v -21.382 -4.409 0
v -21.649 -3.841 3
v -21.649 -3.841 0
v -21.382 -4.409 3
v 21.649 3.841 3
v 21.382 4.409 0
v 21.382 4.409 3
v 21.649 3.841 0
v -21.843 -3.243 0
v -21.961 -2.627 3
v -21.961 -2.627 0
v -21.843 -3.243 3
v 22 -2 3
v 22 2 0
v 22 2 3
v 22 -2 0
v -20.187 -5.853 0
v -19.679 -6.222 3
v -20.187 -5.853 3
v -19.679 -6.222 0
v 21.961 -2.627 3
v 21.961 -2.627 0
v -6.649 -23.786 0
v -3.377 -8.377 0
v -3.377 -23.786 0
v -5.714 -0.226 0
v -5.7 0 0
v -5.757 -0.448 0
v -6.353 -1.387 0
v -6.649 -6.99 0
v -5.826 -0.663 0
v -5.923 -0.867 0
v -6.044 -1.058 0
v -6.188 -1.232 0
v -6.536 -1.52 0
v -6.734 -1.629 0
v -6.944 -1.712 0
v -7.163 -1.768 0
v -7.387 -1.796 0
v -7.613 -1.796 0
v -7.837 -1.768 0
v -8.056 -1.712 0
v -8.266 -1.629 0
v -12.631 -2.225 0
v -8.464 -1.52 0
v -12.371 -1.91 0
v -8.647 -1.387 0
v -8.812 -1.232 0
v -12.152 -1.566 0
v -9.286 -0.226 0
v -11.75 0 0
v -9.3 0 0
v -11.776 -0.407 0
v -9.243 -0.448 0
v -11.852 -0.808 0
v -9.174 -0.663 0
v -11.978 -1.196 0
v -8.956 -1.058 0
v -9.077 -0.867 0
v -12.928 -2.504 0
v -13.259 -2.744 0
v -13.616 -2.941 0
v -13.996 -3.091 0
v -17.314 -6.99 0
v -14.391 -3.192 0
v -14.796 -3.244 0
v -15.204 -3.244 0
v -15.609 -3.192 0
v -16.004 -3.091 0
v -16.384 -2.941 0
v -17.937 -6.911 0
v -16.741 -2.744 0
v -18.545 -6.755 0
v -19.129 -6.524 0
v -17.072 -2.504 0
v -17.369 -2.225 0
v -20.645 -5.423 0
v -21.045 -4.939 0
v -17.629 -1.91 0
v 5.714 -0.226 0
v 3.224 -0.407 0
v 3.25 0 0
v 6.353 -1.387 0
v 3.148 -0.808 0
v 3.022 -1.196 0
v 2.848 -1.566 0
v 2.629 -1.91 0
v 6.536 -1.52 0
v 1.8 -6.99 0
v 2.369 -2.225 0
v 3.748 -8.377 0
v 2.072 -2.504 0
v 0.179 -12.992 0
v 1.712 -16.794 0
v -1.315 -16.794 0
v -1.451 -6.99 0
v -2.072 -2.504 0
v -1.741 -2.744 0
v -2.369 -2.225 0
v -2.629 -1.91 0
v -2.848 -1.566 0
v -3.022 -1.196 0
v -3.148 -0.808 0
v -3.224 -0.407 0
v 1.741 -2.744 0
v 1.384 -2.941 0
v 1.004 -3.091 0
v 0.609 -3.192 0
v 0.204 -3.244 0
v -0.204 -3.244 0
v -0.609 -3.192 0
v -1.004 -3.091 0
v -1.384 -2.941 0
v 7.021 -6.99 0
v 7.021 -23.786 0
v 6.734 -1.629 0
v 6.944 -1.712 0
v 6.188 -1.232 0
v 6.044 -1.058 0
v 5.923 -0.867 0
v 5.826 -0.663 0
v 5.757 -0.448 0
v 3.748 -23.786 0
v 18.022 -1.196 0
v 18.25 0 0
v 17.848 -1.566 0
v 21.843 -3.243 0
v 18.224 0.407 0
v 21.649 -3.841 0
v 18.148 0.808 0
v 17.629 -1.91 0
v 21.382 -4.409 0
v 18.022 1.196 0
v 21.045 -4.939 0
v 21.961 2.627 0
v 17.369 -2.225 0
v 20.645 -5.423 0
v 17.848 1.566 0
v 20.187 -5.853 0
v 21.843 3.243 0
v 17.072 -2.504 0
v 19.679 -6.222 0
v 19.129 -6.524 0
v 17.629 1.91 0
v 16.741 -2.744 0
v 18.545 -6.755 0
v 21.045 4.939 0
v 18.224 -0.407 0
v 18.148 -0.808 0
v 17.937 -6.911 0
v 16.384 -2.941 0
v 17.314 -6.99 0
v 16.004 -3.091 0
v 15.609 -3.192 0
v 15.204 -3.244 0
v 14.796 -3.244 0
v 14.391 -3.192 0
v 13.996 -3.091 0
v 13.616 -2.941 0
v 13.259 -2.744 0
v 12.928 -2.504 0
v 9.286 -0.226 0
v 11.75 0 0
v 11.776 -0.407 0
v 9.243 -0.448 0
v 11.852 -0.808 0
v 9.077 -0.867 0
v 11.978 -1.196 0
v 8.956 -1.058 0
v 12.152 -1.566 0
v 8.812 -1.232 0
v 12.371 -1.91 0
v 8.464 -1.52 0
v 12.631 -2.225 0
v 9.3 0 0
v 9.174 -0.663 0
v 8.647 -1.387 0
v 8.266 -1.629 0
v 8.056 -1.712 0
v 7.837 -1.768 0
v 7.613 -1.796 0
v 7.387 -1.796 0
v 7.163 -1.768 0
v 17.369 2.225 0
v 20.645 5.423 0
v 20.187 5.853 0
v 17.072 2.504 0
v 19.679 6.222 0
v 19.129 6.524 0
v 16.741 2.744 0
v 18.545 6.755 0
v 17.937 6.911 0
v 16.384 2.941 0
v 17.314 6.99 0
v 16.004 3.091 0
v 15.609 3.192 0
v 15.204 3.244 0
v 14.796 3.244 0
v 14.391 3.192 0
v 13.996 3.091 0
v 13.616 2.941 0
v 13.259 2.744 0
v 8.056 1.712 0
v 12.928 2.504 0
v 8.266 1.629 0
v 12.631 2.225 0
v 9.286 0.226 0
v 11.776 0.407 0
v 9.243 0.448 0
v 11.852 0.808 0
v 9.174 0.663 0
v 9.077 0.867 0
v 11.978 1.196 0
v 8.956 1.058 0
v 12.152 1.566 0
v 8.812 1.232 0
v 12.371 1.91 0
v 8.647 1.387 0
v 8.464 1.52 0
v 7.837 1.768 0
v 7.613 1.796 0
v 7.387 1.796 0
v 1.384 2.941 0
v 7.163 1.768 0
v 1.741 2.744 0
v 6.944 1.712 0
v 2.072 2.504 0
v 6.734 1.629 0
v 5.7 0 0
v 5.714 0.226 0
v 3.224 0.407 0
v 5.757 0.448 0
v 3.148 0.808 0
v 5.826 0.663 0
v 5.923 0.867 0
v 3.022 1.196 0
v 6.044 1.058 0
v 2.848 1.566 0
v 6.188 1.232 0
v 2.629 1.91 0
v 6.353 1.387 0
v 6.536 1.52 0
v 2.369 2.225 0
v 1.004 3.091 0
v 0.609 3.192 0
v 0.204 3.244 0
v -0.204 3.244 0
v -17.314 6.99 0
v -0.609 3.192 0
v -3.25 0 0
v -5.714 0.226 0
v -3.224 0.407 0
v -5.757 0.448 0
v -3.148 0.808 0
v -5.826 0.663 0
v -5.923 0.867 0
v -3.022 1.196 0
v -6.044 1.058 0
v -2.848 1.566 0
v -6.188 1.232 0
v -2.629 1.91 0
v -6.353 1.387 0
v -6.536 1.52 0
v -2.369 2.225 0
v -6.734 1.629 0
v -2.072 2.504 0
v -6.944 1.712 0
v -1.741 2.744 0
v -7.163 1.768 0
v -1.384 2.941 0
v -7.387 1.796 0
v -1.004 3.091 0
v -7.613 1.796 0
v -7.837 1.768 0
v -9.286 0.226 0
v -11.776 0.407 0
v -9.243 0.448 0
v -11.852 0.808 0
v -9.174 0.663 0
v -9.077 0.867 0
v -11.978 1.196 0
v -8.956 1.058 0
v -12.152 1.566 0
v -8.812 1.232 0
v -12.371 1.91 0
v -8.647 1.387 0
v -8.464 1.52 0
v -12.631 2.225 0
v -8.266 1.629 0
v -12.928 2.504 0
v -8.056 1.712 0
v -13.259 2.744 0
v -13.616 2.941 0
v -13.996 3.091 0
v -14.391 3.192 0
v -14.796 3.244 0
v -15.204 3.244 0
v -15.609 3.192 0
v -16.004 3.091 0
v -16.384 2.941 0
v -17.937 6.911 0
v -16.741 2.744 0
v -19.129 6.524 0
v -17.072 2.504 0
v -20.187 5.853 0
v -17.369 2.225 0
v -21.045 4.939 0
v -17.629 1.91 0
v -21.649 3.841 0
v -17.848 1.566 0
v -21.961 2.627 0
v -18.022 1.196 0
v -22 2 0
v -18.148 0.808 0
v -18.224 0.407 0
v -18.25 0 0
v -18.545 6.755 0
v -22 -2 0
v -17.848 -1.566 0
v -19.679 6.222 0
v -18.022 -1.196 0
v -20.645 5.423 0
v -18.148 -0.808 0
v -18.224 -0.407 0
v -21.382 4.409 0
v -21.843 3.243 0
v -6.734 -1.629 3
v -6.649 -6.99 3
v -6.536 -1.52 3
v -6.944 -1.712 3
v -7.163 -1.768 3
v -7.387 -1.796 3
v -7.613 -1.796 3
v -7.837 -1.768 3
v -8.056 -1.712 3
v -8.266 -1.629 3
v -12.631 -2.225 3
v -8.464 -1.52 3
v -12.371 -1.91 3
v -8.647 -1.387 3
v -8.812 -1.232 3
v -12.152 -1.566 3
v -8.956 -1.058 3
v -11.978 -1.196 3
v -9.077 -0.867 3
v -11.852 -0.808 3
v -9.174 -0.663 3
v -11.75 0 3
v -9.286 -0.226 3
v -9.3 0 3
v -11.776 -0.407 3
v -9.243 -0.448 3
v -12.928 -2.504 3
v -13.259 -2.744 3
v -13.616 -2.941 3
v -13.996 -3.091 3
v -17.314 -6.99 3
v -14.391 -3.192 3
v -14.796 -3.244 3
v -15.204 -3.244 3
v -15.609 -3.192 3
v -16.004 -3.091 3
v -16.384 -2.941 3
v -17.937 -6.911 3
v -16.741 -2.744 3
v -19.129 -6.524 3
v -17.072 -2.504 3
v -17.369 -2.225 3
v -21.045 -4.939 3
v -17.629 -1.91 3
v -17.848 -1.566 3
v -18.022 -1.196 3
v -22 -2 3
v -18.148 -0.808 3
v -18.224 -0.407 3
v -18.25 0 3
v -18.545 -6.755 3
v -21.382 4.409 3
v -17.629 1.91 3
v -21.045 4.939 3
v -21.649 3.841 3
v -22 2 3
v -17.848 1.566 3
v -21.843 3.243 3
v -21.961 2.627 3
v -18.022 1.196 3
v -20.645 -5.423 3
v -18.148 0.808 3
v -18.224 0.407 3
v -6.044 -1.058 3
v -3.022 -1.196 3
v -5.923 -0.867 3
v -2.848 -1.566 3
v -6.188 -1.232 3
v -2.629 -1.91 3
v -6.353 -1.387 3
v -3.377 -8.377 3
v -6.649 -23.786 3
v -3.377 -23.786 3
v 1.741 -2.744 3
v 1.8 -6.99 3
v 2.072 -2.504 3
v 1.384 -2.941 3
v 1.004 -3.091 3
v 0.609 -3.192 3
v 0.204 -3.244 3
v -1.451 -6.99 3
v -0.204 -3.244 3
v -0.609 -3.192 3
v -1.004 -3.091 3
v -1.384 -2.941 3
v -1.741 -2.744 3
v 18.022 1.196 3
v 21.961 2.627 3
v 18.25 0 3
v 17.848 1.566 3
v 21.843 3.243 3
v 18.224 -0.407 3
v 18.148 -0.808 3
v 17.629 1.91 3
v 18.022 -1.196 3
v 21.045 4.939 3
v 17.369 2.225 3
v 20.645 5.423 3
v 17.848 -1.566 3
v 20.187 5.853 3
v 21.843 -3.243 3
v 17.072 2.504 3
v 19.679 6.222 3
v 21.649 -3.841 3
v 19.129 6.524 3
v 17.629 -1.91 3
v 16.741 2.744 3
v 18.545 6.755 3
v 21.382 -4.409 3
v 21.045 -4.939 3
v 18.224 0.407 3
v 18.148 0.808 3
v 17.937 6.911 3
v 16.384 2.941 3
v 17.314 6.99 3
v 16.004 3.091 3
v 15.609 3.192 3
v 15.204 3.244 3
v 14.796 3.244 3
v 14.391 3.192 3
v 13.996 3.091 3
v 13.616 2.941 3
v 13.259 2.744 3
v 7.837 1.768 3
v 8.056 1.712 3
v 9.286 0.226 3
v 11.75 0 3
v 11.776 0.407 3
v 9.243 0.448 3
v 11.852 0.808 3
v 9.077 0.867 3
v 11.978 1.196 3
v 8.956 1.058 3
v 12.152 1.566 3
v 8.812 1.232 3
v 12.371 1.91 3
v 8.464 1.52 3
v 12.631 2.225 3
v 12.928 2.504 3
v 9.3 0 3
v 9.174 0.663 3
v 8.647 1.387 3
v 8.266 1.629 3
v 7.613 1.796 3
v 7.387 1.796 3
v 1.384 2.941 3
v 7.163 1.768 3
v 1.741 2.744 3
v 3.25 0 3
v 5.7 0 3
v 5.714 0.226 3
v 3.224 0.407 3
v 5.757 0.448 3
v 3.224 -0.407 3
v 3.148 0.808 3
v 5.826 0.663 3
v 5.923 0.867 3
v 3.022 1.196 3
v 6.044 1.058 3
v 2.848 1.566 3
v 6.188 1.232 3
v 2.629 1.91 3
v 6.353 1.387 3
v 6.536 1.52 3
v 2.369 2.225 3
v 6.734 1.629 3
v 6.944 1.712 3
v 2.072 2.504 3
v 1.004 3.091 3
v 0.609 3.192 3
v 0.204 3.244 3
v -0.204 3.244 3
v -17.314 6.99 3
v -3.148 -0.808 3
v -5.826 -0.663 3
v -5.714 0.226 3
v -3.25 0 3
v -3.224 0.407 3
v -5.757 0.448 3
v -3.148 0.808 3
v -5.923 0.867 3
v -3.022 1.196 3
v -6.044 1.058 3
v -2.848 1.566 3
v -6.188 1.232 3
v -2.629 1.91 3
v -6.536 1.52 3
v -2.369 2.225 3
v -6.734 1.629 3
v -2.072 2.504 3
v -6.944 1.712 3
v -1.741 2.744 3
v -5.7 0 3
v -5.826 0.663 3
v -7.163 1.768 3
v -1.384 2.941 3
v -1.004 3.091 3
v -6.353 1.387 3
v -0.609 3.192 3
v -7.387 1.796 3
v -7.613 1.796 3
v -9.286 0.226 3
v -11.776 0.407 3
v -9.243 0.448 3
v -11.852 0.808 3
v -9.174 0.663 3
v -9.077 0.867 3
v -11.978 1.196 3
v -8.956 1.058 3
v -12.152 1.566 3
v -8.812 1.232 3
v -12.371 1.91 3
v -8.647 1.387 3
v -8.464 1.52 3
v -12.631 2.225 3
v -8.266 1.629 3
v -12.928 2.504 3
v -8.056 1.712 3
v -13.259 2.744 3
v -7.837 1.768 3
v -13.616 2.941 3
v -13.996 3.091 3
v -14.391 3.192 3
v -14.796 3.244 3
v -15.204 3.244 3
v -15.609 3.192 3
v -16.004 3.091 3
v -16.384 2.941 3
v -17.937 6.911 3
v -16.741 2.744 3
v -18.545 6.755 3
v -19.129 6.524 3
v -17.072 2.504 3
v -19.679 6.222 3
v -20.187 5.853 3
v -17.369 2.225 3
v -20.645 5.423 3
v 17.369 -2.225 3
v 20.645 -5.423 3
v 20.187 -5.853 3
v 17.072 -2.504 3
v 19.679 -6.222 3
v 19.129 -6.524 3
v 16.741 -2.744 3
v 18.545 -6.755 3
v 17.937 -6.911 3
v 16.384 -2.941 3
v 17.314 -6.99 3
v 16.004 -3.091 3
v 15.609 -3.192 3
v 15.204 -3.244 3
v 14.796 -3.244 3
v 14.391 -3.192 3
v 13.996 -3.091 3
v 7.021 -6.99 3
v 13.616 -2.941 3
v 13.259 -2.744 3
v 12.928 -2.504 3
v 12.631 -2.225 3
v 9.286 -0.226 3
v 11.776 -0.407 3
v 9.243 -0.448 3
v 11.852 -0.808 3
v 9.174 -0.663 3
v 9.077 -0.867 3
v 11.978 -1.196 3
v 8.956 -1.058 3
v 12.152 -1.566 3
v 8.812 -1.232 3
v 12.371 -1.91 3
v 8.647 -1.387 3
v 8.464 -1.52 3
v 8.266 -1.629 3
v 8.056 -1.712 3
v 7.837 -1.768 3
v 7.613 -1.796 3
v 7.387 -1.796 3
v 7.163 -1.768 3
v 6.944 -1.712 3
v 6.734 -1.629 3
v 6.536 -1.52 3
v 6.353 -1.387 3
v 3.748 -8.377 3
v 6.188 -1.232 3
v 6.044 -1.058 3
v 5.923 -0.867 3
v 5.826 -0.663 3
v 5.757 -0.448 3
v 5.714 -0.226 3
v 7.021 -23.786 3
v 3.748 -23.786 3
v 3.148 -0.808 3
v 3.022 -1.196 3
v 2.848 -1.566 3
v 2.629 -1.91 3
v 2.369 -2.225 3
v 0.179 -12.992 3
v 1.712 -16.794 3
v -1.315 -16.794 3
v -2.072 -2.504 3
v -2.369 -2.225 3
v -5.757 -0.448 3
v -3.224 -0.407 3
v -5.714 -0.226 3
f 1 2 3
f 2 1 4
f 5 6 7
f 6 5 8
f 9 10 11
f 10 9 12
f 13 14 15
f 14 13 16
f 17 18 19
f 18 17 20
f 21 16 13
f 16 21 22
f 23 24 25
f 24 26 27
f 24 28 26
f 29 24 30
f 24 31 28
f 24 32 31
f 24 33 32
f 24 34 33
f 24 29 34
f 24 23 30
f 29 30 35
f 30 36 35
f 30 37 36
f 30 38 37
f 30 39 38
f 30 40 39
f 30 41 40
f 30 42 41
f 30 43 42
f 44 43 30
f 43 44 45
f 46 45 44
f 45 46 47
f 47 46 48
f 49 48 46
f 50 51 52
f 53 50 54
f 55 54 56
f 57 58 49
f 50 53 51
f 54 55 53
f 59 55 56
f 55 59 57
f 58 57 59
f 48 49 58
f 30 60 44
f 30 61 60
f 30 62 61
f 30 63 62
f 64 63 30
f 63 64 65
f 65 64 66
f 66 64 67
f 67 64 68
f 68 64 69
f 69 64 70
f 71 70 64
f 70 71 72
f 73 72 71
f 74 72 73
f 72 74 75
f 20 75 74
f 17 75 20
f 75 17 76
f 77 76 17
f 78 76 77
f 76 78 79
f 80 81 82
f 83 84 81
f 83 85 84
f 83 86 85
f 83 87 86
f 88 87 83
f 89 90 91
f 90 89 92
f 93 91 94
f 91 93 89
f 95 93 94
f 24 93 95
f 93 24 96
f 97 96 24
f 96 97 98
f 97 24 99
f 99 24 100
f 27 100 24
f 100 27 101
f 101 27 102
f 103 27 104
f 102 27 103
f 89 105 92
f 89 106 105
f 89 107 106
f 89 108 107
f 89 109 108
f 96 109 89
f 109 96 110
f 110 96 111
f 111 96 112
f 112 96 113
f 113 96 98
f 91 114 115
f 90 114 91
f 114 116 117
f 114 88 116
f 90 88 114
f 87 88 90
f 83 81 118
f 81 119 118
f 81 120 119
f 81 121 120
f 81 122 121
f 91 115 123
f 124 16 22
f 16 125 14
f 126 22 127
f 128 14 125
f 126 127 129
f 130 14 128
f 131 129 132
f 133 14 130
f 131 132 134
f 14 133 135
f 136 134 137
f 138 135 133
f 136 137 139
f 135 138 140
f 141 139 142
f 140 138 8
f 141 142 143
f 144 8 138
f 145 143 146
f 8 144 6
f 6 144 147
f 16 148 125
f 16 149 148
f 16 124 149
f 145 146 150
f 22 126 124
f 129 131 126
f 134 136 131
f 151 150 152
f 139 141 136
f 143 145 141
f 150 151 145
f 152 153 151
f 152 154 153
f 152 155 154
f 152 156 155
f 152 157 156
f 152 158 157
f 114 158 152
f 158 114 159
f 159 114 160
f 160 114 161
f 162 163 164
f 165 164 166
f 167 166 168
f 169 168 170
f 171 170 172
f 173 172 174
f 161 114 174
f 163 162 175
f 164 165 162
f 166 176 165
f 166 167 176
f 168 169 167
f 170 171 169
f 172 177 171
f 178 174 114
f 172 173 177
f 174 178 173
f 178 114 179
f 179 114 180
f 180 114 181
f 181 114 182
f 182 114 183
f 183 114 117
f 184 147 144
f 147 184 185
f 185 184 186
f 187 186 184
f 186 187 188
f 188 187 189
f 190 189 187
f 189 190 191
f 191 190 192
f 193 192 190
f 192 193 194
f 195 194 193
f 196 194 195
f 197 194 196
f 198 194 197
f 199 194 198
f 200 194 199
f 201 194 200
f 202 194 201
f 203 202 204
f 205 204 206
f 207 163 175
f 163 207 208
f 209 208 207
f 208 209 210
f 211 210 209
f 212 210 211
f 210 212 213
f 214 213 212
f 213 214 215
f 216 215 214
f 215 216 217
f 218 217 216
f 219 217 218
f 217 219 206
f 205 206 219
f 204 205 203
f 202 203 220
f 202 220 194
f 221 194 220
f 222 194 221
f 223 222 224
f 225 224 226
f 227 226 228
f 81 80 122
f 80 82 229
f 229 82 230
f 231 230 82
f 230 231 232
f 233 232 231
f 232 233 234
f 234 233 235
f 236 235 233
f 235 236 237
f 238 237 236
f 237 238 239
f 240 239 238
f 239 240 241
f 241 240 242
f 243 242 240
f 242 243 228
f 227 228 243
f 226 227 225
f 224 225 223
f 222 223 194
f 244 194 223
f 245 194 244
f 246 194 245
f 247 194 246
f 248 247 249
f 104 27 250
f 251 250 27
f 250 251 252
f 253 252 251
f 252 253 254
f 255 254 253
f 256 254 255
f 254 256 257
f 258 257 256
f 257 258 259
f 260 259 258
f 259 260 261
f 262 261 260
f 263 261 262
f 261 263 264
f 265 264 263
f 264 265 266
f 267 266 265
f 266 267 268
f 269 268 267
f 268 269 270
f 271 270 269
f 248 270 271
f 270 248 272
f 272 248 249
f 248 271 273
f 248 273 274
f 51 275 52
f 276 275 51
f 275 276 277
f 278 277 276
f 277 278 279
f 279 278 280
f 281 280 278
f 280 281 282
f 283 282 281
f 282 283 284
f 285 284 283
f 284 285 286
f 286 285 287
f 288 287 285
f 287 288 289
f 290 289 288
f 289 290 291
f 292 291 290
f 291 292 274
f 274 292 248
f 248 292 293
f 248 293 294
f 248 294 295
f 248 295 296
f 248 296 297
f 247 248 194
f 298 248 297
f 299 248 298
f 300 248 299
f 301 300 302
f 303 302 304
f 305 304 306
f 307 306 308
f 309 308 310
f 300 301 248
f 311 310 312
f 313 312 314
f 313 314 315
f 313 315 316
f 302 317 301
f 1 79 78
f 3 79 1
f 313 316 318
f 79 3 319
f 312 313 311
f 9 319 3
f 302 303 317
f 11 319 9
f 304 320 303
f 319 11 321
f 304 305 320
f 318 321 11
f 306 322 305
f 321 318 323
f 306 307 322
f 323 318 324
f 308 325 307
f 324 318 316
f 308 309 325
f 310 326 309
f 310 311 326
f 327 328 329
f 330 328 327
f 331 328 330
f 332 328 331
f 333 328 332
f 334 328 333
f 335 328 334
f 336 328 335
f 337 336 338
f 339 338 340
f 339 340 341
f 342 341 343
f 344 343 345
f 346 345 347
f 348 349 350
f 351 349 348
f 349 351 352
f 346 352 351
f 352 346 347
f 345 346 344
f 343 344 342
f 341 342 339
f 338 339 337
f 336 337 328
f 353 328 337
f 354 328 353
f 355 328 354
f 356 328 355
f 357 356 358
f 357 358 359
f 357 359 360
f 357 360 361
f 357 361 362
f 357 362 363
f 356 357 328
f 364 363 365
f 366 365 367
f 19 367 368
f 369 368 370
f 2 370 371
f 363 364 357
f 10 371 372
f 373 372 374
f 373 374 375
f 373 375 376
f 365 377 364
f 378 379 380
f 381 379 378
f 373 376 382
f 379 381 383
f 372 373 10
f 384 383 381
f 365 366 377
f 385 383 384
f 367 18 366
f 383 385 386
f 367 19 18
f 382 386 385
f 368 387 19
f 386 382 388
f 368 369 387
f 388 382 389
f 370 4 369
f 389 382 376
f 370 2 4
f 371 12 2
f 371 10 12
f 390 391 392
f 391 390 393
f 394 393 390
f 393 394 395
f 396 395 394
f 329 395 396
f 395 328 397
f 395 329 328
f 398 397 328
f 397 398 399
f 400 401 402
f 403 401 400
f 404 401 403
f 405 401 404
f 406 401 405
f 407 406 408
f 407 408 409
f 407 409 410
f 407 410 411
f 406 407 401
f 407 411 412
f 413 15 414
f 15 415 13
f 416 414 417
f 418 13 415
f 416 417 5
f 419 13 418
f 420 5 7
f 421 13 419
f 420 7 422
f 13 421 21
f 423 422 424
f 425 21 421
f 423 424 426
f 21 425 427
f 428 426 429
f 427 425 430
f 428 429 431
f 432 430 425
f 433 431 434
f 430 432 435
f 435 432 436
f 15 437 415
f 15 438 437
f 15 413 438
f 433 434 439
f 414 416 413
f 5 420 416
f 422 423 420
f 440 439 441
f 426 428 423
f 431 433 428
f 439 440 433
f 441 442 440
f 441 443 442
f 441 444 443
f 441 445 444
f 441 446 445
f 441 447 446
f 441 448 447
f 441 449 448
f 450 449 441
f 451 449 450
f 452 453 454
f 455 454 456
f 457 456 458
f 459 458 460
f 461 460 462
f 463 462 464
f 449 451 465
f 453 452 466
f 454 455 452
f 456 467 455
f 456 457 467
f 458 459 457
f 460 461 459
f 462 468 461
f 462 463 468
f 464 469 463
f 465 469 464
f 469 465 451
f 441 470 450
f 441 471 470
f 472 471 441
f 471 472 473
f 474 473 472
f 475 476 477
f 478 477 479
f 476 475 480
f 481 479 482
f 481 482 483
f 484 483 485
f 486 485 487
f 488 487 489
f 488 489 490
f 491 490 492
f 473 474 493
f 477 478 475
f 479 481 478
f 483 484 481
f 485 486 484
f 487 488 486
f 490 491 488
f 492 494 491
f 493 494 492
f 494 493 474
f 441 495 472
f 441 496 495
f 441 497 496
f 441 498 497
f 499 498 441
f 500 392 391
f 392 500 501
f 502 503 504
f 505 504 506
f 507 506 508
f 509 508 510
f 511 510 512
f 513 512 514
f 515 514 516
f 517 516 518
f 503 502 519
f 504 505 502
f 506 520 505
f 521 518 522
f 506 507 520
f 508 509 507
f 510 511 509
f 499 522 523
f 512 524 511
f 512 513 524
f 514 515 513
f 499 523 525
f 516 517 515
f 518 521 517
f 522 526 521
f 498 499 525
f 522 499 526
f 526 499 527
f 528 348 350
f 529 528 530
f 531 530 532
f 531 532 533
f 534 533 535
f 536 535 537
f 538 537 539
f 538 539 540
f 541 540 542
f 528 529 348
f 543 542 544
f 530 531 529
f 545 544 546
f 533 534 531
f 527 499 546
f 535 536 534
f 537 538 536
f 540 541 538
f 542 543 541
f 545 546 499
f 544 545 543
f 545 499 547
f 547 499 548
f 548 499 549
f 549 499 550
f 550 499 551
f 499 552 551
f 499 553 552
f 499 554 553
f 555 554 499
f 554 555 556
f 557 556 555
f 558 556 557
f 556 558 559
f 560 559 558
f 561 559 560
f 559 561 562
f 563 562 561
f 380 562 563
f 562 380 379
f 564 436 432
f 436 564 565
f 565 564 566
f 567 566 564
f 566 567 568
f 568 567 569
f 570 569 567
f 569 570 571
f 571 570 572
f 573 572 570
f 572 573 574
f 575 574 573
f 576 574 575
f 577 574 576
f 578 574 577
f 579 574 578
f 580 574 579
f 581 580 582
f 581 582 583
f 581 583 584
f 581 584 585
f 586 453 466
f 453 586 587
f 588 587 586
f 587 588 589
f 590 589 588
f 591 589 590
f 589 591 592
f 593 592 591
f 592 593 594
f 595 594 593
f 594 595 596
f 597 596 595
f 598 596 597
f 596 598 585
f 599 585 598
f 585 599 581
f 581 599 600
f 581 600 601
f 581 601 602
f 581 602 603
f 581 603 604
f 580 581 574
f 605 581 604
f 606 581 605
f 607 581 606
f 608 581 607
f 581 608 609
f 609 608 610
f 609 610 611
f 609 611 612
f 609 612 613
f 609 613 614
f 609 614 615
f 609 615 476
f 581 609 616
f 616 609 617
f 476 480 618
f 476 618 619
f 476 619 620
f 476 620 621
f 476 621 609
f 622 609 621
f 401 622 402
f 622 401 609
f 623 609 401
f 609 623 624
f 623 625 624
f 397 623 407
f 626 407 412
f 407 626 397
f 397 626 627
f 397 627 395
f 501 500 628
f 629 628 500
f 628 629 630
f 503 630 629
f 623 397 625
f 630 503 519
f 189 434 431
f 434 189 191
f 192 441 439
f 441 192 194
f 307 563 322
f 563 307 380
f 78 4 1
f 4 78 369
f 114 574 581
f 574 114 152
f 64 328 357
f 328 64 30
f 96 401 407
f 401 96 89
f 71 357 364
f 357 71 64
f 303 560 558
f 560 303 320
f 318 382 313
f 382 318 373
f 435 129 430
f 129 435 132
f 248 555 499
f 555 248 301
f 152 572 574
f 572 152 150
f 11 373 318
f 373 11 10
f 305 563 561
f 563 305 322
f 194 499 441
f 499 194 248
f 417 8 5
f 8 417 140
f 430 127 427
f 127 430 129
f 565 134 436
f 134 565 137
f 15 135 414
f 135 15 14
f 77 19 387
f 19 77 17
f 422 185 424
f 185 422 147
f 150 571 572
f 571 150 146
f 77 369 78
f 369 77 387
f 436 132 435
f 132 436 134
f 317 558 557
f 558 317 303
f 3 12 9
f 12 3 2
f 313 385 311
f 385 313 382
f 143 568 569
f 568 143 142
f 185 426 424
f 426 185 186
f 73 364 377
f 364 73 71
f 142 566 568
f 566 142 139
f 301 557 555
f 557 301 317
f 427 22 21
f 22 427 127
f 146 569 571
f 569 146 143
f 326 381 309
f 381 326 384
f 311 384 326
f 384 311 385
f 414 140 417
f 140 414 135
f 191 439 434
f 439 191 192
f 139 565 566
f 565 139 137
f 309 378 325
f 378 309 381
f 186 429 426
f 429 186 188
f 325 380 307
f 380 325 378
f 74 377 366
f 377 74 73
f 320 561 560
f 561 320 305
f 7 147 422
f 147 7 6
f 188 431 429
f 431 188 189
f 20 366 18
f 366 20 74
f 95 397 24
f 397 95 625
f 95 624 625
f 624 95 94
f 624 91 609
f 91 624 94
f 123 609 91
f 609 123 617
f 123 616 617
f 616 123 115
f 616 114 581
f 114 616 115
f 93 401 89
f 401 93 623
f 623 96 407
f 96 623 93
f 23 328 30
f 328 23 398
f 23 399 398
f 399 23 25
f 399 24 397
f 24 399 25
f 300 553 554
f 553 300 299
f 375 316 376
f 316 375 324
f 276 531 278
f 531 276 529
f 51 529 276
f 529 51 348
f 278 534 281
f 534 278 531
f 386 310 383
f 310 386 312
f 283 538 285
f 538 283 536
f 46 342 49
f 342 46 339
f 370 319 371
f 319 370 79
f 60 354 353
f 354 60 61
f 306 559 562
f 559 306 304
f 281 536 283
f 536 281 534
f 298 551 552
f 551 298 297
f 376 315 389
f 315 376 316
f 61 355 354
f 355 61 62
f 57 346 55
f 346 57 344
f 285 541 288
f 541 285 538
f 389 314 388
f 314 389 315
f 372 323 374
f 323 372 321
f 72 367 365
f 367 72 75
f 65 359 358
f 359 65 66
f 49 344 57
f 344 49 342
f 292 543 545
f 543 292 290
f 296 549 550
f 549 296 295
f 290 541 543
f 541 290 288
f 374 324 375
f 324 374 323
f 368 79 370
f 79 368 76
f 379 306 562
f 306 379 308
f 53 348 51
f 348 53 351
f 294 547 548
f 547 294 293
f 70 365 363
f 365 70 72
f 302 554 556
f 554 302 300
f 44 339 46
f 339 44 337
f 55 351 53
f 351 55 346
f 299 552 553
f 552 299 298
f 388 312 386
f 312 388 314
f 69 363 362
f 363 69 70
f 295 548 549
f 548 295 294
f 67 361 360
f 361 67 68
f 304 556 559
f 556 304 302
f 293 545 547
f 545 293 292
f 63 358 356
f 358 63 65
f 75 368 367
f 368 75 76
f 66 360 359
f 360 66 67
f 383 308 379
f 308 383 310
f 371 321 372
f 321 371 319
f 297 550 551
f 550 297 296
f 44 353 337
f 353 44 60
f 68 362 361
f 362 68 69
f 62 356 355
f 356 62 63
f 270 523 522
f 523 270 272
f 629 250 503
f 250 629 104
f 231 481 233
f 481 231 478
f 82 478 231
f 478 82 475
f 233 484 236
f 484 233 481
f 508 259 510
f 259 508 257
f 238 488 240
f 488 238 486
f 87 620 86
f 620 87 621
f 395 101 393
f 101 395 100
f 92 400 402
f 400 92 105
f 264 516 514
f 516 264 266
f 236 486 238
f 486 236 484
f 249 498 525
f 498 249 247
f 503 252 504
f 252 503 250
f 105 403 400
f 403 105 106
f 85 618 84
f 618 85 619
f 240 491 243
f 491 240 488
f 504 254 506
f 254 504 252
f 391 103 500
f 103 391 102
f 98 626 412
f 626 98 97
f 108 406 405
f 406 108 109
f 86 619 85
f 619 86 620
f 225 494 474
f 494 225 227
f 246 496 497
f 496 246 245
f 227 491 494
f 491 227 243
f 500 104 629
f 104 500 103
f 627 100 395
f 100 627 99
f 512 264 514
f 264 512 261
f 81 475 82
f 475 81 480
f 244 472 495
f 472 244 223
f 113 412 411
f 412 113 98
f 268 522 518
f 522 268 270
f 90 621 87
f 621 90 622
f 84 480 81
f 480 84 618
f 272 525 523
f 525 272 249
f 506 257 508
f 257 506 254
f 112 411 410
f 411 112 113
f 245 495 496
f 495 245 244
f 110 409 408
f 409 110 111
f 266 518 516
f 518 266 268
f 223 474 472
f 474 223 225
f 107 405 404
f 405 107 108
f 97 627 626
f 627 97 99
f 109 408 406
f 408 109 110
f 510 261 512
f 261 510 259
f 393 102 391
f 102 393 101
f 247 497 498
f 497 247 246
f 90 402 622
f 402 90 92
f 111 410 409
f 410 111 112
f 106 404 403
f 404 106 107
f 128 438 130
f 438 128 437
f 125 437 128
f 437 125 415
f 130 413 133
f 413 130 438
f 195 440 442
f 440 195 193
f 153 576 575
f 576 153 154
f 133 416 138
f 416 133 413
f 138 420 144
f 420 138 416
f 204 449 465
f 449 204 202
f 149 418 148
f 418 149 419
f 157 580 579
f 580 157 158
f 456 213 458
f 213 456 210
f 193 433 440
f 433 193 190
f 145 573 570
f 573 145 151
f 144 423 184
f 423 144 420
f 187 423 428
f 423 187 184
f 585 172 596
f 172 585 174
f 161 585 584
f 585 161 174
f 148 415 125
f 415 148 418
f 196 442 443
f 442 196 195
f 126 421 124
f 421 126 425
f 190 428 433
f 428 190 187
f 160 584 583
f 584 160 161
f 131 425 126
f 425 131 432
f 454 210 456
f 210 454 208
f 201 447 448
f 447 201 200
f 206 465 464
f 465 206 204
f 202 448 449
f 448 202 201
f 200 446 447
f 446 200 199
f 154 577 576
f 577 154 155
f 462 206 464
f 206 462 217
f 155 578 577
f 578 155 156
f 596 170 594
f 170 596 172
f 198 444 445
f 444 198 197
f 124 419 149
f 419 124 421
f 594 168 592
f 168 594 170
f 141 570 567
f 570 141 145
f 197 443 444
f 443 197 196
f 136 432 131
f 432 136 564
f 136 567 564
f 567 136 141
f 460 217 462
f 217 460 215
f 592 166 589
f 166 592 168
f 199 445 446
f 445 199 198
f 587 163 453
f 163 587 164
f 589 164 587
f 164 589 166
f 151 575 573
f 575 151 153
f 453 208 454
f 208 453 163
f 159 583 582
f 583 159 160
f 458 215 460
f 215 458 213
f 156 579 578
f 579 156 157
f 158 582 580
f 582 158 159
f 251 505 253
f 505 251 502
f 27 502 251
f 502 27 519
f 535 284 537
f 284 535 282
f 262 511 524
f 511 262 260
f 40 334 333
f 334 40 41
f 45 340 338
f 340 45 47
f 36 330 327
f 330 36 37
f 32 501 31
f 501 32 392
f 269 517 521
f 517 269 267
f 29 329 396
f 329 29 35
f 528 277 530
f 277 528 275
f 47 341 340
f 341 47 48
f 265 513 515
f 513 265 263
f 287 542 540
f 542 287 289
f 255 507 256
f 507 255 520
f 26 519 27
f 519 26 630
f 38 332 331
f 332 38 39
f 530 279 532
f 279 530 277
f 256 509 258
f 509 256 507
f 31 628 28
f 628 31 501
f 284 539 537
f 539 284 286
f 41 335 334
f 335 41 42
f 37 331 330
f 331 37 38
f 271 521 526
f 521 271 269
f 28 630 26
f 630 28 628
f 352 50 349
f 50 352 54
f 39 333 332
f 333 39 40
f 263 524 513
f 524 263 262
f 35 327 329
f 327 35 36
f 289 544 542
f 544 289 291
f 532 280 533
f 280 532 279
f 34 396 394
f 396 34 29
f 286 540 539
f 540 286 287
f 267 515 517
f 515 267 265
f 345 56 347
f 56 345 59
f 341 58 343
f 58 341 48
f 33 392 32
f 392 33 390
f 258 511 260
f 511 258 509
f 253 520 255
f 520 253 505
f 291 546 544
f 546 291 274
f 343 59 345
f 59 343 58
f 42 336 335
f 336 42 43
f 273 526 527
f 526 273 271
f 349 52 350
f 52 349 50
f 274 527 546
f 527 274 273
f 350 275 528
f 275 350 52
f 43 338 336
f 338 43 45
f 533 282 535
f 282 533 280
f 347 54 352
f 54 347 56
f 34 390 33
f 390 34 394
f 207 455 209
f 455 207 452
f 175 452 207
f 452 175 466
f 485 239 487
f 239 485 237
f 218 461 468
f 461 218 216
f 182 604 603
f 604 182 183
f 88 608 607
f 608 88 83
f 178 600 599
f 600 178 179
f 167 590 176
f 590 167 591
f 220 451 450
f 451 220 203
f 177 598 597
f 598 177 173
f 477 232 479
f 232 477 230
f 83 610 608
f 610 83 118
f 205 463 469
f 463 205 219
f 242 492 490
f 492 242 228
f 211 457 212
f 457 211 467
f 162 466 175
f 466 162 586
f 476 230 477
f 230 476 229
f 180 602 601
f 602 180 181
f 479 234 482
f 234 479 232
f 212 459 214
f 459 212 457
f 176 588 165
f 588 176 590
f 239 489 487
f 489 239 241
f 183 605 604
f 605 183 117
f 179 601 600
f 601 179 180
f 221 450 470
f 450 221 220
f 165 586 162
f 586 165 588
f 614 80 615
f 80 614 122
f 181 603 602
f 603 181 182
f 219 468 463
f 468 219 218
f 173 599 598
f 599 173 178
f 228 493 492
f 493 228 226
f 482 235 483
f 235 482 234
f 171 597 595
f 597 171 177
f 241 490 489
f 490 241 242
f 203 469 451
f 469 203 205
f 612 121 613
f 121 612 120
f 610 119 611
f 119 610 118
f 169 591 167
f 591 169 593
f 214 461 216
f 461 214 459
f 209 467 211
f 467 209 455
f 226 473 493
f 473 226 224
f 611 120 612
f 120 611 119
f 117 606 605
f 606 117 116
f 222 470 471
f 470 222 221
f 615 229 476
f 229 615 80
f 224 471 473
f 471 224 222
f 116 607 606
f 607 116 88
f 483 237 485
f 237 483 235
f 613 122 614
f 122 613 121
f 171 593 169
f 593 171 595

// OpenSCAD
$fn = 50;


difference() {
	union() {
		hull() {
			translate(v = [-17.0000000000, 2.0000000000, 0]) {
				cylinder(h = 3, r = 5);
			}
			translate(v = [17.0000000000, 2.0000000000, 0]) {
				cylinder(h = 3, r = 5);
			}
			translate(v = [-17.0000000000, -2.0000000000, 0]) {
				cylinder(h = 3, r = 5);
			}
			translate(v = [17.0000000000, -2.0000000000, 0]) {
				cylinder(h = 3, r = 5);
			}
		}
		translate(v = [0, -5, 0]) {
			linear_extrude(height = 3) {
				text(font = "DejaVu Sans Mono:style=Bold", halign = "center", size = 19.0000000000, text = "M", valign = "top");
			}
		}
	}
	union() {
		translate(v = [-15.0000000000, 0.0000000000, 0]) {
			translate(v = [0, 0, -100]) {
				cylinder(h = 200, r = 3.2500000000);
			}
		}
		translate(v = [0, 0, -100]) {
			cylinder(h = 200, r = 3.2500000000);
		}
		translate(v = [15.0000000000, 0.0000000000, 0]) {
			translate(v = [0, 0, -100]) {
				cylinder(h = 200, r = 3.2500000000);
			}
		}
		translate(v = [-15.0000000000, 0.0000000000, 0]) {
			translate(v = [0, 0, -100]) {
				cylinder(h = 200, r = 1.8000000000);
			}
		}
		translate(v = [-7.5000000000, 0.0000000000, 0]) {
			translate(v = [0, 0, -100]) {
				cylinder(h = 200, r = 1.8000000000);
			}
		}
		translate(v = [0, 0, -100]) {
			cylinder(h = 200, r = 1.8000000000);
		}
		translate(v = [7.5000000000, 0.0000000000, 0]) {
			translate(v = [0, 0, -100]) {
				cylinder(h = 200, r = 1.8000000000);
			}
		}
		translate(v = [15.0000000000, 0.0000000000, 0]) {
			translate(v = [0, 0, -100]) {
				cylinder(h = 200, r = 1.8000000000);
			}
		}
	}
}
